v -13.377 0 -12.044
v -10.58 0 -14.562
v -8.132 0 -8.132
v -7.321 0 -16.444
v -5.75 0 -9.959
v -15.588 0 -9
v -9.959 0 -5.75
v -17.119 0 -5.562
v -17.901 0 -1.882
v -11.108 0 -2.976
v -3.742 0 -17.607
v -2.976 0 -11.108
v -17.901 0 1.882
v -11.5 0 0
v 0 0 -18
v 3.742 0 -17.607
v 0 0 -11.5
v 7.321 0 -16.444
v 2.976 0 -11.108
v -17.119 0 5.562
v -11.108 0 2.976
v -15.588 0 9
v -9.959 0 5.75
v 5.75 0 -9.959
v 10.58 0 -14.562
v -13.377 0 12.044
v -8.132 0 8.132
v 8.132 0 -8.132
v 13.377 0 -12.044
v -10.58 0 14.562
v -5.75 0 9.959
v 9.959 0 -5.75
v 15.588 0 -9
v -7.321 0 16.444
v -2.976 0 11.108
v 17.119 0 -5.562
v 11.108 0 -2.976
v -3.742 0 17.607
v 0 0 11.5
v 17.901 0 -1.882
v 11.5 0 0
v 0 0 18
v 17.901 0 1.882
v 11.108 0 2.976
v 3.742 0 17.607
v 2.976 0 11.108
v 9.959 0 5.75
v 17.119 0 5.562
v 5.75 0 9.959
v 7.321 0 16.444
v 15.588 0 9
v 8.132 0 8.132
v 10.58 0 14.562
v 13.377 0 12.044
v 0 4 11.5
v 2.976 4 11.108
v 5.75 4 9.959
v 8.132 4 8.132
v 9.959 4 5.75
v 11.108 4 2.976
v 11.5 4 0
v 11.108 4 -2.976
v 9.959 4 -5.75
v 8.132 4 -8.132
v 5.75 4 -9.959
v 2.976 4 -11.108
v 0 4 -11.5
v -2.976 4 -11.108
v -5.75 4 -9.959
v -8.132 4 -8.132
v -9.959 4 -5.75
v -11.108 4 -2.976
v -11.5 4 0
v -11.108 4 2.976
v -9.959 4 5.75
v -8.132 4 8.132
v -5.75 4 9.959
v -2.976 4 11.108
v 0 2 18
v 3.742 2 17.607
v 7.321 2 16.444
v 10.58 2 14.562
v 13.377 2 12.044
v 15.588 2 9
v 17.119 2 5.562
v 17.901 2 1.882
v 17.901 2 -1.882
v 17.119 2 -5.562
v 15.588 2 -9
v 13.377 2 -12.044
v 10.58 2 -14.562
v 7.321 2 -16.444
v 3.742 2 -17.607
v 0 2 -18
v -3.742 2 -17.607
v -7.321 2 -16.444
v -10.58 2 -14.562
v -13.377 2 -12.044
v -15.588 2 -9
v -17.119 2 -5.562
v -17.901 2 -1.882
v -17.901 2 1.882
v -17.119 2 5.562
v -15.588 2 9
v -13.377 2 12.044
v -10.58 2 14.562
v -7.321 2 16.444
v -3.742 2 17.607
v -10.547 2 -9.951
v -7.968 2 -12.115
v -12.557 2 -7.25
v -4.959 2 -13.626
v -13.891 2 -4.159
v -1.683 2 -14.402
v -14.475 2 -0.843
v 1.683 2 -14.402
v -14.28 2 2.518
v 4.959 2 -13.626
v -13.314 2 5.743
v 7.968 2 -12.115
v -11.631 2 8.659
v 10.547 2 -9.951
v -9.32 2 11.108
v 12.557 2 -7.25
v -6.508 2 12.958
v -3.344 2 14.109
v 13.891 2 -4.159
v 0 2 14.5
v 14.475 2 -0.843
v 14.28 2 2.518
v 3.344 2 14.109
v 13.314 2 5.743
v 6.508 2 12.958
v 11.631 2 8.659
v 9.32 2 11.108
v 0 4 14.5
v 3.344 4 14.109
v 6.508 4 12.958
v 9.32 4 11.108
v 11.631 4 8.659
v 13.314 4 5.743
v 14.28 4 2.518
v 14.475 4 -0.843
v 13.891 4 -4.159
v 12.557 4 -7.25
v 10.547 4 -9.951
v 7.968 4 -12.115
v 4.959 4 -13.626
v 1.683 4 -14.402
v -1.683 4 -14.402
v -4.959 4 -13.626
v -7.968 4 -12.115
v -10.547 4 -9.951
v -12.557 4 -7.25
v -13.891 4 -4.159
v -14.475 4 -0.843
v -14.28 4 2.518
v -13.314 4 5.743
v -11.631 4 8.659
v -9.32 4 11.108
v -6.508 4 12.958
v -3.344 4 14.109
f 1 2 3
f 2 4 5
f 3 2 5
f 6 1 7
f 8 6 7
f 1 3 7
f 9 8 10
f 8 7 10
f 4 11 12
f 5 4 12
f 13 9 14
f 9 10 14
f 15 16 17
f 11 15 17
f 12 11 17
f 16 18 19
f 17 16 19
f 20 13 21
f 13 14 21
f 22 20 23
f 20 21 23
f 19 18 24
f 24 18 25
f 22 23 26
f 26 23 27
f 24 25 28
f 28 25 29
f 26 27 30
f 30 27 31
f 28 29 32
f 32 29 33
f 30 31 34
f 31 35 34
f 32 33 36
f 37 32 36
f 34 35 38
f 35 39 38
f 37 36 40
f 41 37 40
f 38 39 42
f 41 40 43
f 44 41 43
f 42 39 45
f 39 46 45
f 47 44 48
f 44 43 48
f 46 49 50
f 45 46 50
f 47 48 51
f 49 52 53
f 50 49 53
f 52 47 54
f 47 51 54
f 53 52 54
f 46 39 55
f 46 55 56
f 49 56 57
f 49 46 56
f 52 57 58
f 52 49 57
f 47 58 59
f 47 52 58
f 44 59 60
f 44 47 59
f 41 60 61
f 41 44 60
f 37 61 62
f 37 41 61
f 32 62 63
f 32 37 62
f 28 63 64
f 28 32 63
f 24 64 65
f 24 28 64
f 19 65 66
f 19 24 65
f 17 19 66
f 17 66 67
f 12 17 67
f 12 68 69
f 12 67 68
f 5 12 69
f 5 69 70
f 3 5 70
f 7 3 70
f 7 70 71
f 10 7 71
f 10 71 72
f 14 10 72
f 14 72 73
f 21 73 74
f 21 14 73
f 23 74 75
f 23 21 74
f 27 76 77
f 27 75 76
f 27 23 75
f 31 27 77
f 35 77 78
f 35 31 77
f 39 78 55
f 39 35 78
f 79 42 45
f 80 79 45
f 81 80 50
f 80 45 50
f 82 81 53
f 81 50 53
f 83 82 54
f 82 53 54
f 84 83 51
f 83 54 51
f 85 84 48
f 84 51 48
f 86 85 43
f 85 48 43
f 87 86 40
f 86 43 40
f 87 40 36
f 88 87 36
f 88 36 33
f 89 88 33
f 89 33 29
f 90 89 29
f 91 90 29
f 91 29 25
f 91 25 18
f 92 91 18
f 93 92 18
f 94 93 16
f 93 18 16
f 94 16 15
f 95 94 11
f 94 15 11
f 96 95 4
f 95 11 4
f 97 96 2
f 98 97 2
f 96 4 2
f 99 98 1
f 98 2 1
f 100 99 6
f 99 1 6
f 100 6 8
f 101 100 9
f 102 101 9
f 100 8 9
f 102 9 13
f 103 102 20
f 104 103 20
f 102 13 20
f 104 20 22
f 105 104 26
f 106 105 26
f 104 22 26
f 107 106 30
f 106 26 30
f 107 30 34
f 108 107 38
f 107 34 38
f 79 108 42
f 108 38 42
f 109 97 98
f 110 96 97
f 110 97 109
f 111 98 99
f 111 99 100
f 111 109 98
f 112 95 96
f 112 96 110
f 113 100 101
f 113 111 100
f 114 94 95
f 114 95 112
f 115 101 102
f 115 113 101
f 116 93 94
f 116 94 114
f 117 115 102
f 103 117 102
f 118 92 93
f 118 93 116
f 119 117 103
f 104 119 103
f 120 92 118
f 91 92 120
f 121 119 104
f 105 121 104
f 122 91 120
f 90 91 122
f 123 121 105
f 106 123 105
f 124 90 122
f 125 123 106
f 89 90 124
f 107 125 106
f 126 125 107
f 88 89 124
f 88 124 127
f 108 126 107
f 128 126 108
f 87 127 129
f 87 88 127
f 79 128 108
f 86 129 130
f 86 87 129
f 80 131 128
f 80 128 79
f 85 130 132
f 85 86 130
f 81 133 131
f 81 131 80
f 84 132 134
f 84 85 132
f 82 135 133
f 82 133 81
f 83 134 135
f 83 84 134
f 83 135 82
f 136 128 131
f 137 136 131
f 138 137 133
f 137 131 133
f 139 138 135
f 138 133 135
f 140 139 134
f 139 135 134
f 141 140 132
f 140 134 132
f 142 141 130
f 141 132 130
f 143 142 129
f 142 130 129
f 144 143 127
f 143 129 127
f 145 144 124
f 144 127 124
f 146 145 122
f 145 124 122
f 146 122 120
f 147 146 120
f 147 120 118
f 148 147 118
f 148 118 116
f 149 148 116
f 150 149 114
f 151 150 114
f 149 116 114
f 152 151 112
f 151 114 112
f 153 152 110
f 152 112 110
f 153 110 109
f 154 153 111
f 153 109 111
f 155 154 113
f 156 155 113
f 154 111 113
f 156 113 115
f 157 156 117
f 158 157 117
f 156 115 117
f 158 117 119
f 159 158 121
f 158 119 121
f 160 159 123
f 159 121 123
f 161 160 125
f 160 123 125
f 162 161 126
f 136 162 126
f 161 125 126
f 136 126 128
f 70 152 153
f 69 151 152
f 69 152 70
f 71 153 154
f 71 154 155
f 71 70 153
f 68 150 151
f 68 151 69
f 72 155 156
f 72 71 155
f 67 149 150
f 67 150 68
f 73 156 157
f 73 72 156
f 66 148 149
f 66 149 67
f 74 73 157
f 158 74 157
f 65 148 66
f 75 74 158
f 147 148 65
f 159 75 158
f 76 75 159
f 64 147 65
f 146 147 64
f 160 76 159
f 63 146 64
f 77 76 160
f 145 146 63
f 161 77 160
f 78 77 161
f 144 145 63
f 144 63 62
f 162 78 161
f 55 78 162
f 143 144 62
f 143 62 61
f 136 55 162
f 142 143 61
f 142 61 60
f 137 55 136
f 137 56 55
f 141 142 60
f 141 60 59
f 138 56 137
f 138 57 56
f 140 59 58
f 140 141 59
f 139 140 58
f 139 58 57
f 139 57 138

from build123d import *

# Parameters (mm, degrees)
SKETCH1_R               = 18
BOSS_EXTRUDE1_DEPTH     = 2
SKETCH2_R               = 14.5
BOSS_EXTRUDE2_DEPTH     = 2
CUT_EXTRUDE3_DEPTH      = 26.768197453
CUT_EXTRUDE3_DEPTH_BACK = 26.768197453
SKETCH3_R               = 11.5


with BuildPart() as part:
    # Sketch1 → Boss-Extrude1 (new body)
    with BuildSketch(Plane(origin=(0, 0, 0), x_dir=(1, 0, 0), z_dir=(0, 1, 0))):
        with Locations(Location((0, 0, 0), (0, 0, 270))):
            Circle(SKETCH1_R)
    extrude(amount=BOSS_EXTRUDE1_DEPTH)

    # Sketch2 → Boss-Extrude2 (add)
    with BuildSketch(Plane(origin=(0, 2, 0), x_dir=(1, 0, 0), z_dir=(0, 1, 0))):
        with Locations(Location((0, 0, 0), (0, 0, 270))):
            Circle(SKETCH2_R)
    extrude(amount=BOSS_EXTRUDE2_DEPTH)

    # Sketch3 → Cut-Extrude3 (cut, two sides: drawn at the far end of the back side and taken through both)
    with BuildSketch(Plane(origin=(0, 0, 0), x_dir=(1, 0, 0), z_dir=(0, 1, 0)).offset(-CUT_EXTRUDE3_DEPTH_BACK)):
        with Locations(Location((0, 0, 0), (0, 0, 270))):
            Circle(SKETCH3_R)
    extrude(amount=CUT_EXTRUDE3_DEPTH + CUT_EXTRUDE3_DEPTH_BACK, mode=Mode.SUBTRACT)


solid = part.part
